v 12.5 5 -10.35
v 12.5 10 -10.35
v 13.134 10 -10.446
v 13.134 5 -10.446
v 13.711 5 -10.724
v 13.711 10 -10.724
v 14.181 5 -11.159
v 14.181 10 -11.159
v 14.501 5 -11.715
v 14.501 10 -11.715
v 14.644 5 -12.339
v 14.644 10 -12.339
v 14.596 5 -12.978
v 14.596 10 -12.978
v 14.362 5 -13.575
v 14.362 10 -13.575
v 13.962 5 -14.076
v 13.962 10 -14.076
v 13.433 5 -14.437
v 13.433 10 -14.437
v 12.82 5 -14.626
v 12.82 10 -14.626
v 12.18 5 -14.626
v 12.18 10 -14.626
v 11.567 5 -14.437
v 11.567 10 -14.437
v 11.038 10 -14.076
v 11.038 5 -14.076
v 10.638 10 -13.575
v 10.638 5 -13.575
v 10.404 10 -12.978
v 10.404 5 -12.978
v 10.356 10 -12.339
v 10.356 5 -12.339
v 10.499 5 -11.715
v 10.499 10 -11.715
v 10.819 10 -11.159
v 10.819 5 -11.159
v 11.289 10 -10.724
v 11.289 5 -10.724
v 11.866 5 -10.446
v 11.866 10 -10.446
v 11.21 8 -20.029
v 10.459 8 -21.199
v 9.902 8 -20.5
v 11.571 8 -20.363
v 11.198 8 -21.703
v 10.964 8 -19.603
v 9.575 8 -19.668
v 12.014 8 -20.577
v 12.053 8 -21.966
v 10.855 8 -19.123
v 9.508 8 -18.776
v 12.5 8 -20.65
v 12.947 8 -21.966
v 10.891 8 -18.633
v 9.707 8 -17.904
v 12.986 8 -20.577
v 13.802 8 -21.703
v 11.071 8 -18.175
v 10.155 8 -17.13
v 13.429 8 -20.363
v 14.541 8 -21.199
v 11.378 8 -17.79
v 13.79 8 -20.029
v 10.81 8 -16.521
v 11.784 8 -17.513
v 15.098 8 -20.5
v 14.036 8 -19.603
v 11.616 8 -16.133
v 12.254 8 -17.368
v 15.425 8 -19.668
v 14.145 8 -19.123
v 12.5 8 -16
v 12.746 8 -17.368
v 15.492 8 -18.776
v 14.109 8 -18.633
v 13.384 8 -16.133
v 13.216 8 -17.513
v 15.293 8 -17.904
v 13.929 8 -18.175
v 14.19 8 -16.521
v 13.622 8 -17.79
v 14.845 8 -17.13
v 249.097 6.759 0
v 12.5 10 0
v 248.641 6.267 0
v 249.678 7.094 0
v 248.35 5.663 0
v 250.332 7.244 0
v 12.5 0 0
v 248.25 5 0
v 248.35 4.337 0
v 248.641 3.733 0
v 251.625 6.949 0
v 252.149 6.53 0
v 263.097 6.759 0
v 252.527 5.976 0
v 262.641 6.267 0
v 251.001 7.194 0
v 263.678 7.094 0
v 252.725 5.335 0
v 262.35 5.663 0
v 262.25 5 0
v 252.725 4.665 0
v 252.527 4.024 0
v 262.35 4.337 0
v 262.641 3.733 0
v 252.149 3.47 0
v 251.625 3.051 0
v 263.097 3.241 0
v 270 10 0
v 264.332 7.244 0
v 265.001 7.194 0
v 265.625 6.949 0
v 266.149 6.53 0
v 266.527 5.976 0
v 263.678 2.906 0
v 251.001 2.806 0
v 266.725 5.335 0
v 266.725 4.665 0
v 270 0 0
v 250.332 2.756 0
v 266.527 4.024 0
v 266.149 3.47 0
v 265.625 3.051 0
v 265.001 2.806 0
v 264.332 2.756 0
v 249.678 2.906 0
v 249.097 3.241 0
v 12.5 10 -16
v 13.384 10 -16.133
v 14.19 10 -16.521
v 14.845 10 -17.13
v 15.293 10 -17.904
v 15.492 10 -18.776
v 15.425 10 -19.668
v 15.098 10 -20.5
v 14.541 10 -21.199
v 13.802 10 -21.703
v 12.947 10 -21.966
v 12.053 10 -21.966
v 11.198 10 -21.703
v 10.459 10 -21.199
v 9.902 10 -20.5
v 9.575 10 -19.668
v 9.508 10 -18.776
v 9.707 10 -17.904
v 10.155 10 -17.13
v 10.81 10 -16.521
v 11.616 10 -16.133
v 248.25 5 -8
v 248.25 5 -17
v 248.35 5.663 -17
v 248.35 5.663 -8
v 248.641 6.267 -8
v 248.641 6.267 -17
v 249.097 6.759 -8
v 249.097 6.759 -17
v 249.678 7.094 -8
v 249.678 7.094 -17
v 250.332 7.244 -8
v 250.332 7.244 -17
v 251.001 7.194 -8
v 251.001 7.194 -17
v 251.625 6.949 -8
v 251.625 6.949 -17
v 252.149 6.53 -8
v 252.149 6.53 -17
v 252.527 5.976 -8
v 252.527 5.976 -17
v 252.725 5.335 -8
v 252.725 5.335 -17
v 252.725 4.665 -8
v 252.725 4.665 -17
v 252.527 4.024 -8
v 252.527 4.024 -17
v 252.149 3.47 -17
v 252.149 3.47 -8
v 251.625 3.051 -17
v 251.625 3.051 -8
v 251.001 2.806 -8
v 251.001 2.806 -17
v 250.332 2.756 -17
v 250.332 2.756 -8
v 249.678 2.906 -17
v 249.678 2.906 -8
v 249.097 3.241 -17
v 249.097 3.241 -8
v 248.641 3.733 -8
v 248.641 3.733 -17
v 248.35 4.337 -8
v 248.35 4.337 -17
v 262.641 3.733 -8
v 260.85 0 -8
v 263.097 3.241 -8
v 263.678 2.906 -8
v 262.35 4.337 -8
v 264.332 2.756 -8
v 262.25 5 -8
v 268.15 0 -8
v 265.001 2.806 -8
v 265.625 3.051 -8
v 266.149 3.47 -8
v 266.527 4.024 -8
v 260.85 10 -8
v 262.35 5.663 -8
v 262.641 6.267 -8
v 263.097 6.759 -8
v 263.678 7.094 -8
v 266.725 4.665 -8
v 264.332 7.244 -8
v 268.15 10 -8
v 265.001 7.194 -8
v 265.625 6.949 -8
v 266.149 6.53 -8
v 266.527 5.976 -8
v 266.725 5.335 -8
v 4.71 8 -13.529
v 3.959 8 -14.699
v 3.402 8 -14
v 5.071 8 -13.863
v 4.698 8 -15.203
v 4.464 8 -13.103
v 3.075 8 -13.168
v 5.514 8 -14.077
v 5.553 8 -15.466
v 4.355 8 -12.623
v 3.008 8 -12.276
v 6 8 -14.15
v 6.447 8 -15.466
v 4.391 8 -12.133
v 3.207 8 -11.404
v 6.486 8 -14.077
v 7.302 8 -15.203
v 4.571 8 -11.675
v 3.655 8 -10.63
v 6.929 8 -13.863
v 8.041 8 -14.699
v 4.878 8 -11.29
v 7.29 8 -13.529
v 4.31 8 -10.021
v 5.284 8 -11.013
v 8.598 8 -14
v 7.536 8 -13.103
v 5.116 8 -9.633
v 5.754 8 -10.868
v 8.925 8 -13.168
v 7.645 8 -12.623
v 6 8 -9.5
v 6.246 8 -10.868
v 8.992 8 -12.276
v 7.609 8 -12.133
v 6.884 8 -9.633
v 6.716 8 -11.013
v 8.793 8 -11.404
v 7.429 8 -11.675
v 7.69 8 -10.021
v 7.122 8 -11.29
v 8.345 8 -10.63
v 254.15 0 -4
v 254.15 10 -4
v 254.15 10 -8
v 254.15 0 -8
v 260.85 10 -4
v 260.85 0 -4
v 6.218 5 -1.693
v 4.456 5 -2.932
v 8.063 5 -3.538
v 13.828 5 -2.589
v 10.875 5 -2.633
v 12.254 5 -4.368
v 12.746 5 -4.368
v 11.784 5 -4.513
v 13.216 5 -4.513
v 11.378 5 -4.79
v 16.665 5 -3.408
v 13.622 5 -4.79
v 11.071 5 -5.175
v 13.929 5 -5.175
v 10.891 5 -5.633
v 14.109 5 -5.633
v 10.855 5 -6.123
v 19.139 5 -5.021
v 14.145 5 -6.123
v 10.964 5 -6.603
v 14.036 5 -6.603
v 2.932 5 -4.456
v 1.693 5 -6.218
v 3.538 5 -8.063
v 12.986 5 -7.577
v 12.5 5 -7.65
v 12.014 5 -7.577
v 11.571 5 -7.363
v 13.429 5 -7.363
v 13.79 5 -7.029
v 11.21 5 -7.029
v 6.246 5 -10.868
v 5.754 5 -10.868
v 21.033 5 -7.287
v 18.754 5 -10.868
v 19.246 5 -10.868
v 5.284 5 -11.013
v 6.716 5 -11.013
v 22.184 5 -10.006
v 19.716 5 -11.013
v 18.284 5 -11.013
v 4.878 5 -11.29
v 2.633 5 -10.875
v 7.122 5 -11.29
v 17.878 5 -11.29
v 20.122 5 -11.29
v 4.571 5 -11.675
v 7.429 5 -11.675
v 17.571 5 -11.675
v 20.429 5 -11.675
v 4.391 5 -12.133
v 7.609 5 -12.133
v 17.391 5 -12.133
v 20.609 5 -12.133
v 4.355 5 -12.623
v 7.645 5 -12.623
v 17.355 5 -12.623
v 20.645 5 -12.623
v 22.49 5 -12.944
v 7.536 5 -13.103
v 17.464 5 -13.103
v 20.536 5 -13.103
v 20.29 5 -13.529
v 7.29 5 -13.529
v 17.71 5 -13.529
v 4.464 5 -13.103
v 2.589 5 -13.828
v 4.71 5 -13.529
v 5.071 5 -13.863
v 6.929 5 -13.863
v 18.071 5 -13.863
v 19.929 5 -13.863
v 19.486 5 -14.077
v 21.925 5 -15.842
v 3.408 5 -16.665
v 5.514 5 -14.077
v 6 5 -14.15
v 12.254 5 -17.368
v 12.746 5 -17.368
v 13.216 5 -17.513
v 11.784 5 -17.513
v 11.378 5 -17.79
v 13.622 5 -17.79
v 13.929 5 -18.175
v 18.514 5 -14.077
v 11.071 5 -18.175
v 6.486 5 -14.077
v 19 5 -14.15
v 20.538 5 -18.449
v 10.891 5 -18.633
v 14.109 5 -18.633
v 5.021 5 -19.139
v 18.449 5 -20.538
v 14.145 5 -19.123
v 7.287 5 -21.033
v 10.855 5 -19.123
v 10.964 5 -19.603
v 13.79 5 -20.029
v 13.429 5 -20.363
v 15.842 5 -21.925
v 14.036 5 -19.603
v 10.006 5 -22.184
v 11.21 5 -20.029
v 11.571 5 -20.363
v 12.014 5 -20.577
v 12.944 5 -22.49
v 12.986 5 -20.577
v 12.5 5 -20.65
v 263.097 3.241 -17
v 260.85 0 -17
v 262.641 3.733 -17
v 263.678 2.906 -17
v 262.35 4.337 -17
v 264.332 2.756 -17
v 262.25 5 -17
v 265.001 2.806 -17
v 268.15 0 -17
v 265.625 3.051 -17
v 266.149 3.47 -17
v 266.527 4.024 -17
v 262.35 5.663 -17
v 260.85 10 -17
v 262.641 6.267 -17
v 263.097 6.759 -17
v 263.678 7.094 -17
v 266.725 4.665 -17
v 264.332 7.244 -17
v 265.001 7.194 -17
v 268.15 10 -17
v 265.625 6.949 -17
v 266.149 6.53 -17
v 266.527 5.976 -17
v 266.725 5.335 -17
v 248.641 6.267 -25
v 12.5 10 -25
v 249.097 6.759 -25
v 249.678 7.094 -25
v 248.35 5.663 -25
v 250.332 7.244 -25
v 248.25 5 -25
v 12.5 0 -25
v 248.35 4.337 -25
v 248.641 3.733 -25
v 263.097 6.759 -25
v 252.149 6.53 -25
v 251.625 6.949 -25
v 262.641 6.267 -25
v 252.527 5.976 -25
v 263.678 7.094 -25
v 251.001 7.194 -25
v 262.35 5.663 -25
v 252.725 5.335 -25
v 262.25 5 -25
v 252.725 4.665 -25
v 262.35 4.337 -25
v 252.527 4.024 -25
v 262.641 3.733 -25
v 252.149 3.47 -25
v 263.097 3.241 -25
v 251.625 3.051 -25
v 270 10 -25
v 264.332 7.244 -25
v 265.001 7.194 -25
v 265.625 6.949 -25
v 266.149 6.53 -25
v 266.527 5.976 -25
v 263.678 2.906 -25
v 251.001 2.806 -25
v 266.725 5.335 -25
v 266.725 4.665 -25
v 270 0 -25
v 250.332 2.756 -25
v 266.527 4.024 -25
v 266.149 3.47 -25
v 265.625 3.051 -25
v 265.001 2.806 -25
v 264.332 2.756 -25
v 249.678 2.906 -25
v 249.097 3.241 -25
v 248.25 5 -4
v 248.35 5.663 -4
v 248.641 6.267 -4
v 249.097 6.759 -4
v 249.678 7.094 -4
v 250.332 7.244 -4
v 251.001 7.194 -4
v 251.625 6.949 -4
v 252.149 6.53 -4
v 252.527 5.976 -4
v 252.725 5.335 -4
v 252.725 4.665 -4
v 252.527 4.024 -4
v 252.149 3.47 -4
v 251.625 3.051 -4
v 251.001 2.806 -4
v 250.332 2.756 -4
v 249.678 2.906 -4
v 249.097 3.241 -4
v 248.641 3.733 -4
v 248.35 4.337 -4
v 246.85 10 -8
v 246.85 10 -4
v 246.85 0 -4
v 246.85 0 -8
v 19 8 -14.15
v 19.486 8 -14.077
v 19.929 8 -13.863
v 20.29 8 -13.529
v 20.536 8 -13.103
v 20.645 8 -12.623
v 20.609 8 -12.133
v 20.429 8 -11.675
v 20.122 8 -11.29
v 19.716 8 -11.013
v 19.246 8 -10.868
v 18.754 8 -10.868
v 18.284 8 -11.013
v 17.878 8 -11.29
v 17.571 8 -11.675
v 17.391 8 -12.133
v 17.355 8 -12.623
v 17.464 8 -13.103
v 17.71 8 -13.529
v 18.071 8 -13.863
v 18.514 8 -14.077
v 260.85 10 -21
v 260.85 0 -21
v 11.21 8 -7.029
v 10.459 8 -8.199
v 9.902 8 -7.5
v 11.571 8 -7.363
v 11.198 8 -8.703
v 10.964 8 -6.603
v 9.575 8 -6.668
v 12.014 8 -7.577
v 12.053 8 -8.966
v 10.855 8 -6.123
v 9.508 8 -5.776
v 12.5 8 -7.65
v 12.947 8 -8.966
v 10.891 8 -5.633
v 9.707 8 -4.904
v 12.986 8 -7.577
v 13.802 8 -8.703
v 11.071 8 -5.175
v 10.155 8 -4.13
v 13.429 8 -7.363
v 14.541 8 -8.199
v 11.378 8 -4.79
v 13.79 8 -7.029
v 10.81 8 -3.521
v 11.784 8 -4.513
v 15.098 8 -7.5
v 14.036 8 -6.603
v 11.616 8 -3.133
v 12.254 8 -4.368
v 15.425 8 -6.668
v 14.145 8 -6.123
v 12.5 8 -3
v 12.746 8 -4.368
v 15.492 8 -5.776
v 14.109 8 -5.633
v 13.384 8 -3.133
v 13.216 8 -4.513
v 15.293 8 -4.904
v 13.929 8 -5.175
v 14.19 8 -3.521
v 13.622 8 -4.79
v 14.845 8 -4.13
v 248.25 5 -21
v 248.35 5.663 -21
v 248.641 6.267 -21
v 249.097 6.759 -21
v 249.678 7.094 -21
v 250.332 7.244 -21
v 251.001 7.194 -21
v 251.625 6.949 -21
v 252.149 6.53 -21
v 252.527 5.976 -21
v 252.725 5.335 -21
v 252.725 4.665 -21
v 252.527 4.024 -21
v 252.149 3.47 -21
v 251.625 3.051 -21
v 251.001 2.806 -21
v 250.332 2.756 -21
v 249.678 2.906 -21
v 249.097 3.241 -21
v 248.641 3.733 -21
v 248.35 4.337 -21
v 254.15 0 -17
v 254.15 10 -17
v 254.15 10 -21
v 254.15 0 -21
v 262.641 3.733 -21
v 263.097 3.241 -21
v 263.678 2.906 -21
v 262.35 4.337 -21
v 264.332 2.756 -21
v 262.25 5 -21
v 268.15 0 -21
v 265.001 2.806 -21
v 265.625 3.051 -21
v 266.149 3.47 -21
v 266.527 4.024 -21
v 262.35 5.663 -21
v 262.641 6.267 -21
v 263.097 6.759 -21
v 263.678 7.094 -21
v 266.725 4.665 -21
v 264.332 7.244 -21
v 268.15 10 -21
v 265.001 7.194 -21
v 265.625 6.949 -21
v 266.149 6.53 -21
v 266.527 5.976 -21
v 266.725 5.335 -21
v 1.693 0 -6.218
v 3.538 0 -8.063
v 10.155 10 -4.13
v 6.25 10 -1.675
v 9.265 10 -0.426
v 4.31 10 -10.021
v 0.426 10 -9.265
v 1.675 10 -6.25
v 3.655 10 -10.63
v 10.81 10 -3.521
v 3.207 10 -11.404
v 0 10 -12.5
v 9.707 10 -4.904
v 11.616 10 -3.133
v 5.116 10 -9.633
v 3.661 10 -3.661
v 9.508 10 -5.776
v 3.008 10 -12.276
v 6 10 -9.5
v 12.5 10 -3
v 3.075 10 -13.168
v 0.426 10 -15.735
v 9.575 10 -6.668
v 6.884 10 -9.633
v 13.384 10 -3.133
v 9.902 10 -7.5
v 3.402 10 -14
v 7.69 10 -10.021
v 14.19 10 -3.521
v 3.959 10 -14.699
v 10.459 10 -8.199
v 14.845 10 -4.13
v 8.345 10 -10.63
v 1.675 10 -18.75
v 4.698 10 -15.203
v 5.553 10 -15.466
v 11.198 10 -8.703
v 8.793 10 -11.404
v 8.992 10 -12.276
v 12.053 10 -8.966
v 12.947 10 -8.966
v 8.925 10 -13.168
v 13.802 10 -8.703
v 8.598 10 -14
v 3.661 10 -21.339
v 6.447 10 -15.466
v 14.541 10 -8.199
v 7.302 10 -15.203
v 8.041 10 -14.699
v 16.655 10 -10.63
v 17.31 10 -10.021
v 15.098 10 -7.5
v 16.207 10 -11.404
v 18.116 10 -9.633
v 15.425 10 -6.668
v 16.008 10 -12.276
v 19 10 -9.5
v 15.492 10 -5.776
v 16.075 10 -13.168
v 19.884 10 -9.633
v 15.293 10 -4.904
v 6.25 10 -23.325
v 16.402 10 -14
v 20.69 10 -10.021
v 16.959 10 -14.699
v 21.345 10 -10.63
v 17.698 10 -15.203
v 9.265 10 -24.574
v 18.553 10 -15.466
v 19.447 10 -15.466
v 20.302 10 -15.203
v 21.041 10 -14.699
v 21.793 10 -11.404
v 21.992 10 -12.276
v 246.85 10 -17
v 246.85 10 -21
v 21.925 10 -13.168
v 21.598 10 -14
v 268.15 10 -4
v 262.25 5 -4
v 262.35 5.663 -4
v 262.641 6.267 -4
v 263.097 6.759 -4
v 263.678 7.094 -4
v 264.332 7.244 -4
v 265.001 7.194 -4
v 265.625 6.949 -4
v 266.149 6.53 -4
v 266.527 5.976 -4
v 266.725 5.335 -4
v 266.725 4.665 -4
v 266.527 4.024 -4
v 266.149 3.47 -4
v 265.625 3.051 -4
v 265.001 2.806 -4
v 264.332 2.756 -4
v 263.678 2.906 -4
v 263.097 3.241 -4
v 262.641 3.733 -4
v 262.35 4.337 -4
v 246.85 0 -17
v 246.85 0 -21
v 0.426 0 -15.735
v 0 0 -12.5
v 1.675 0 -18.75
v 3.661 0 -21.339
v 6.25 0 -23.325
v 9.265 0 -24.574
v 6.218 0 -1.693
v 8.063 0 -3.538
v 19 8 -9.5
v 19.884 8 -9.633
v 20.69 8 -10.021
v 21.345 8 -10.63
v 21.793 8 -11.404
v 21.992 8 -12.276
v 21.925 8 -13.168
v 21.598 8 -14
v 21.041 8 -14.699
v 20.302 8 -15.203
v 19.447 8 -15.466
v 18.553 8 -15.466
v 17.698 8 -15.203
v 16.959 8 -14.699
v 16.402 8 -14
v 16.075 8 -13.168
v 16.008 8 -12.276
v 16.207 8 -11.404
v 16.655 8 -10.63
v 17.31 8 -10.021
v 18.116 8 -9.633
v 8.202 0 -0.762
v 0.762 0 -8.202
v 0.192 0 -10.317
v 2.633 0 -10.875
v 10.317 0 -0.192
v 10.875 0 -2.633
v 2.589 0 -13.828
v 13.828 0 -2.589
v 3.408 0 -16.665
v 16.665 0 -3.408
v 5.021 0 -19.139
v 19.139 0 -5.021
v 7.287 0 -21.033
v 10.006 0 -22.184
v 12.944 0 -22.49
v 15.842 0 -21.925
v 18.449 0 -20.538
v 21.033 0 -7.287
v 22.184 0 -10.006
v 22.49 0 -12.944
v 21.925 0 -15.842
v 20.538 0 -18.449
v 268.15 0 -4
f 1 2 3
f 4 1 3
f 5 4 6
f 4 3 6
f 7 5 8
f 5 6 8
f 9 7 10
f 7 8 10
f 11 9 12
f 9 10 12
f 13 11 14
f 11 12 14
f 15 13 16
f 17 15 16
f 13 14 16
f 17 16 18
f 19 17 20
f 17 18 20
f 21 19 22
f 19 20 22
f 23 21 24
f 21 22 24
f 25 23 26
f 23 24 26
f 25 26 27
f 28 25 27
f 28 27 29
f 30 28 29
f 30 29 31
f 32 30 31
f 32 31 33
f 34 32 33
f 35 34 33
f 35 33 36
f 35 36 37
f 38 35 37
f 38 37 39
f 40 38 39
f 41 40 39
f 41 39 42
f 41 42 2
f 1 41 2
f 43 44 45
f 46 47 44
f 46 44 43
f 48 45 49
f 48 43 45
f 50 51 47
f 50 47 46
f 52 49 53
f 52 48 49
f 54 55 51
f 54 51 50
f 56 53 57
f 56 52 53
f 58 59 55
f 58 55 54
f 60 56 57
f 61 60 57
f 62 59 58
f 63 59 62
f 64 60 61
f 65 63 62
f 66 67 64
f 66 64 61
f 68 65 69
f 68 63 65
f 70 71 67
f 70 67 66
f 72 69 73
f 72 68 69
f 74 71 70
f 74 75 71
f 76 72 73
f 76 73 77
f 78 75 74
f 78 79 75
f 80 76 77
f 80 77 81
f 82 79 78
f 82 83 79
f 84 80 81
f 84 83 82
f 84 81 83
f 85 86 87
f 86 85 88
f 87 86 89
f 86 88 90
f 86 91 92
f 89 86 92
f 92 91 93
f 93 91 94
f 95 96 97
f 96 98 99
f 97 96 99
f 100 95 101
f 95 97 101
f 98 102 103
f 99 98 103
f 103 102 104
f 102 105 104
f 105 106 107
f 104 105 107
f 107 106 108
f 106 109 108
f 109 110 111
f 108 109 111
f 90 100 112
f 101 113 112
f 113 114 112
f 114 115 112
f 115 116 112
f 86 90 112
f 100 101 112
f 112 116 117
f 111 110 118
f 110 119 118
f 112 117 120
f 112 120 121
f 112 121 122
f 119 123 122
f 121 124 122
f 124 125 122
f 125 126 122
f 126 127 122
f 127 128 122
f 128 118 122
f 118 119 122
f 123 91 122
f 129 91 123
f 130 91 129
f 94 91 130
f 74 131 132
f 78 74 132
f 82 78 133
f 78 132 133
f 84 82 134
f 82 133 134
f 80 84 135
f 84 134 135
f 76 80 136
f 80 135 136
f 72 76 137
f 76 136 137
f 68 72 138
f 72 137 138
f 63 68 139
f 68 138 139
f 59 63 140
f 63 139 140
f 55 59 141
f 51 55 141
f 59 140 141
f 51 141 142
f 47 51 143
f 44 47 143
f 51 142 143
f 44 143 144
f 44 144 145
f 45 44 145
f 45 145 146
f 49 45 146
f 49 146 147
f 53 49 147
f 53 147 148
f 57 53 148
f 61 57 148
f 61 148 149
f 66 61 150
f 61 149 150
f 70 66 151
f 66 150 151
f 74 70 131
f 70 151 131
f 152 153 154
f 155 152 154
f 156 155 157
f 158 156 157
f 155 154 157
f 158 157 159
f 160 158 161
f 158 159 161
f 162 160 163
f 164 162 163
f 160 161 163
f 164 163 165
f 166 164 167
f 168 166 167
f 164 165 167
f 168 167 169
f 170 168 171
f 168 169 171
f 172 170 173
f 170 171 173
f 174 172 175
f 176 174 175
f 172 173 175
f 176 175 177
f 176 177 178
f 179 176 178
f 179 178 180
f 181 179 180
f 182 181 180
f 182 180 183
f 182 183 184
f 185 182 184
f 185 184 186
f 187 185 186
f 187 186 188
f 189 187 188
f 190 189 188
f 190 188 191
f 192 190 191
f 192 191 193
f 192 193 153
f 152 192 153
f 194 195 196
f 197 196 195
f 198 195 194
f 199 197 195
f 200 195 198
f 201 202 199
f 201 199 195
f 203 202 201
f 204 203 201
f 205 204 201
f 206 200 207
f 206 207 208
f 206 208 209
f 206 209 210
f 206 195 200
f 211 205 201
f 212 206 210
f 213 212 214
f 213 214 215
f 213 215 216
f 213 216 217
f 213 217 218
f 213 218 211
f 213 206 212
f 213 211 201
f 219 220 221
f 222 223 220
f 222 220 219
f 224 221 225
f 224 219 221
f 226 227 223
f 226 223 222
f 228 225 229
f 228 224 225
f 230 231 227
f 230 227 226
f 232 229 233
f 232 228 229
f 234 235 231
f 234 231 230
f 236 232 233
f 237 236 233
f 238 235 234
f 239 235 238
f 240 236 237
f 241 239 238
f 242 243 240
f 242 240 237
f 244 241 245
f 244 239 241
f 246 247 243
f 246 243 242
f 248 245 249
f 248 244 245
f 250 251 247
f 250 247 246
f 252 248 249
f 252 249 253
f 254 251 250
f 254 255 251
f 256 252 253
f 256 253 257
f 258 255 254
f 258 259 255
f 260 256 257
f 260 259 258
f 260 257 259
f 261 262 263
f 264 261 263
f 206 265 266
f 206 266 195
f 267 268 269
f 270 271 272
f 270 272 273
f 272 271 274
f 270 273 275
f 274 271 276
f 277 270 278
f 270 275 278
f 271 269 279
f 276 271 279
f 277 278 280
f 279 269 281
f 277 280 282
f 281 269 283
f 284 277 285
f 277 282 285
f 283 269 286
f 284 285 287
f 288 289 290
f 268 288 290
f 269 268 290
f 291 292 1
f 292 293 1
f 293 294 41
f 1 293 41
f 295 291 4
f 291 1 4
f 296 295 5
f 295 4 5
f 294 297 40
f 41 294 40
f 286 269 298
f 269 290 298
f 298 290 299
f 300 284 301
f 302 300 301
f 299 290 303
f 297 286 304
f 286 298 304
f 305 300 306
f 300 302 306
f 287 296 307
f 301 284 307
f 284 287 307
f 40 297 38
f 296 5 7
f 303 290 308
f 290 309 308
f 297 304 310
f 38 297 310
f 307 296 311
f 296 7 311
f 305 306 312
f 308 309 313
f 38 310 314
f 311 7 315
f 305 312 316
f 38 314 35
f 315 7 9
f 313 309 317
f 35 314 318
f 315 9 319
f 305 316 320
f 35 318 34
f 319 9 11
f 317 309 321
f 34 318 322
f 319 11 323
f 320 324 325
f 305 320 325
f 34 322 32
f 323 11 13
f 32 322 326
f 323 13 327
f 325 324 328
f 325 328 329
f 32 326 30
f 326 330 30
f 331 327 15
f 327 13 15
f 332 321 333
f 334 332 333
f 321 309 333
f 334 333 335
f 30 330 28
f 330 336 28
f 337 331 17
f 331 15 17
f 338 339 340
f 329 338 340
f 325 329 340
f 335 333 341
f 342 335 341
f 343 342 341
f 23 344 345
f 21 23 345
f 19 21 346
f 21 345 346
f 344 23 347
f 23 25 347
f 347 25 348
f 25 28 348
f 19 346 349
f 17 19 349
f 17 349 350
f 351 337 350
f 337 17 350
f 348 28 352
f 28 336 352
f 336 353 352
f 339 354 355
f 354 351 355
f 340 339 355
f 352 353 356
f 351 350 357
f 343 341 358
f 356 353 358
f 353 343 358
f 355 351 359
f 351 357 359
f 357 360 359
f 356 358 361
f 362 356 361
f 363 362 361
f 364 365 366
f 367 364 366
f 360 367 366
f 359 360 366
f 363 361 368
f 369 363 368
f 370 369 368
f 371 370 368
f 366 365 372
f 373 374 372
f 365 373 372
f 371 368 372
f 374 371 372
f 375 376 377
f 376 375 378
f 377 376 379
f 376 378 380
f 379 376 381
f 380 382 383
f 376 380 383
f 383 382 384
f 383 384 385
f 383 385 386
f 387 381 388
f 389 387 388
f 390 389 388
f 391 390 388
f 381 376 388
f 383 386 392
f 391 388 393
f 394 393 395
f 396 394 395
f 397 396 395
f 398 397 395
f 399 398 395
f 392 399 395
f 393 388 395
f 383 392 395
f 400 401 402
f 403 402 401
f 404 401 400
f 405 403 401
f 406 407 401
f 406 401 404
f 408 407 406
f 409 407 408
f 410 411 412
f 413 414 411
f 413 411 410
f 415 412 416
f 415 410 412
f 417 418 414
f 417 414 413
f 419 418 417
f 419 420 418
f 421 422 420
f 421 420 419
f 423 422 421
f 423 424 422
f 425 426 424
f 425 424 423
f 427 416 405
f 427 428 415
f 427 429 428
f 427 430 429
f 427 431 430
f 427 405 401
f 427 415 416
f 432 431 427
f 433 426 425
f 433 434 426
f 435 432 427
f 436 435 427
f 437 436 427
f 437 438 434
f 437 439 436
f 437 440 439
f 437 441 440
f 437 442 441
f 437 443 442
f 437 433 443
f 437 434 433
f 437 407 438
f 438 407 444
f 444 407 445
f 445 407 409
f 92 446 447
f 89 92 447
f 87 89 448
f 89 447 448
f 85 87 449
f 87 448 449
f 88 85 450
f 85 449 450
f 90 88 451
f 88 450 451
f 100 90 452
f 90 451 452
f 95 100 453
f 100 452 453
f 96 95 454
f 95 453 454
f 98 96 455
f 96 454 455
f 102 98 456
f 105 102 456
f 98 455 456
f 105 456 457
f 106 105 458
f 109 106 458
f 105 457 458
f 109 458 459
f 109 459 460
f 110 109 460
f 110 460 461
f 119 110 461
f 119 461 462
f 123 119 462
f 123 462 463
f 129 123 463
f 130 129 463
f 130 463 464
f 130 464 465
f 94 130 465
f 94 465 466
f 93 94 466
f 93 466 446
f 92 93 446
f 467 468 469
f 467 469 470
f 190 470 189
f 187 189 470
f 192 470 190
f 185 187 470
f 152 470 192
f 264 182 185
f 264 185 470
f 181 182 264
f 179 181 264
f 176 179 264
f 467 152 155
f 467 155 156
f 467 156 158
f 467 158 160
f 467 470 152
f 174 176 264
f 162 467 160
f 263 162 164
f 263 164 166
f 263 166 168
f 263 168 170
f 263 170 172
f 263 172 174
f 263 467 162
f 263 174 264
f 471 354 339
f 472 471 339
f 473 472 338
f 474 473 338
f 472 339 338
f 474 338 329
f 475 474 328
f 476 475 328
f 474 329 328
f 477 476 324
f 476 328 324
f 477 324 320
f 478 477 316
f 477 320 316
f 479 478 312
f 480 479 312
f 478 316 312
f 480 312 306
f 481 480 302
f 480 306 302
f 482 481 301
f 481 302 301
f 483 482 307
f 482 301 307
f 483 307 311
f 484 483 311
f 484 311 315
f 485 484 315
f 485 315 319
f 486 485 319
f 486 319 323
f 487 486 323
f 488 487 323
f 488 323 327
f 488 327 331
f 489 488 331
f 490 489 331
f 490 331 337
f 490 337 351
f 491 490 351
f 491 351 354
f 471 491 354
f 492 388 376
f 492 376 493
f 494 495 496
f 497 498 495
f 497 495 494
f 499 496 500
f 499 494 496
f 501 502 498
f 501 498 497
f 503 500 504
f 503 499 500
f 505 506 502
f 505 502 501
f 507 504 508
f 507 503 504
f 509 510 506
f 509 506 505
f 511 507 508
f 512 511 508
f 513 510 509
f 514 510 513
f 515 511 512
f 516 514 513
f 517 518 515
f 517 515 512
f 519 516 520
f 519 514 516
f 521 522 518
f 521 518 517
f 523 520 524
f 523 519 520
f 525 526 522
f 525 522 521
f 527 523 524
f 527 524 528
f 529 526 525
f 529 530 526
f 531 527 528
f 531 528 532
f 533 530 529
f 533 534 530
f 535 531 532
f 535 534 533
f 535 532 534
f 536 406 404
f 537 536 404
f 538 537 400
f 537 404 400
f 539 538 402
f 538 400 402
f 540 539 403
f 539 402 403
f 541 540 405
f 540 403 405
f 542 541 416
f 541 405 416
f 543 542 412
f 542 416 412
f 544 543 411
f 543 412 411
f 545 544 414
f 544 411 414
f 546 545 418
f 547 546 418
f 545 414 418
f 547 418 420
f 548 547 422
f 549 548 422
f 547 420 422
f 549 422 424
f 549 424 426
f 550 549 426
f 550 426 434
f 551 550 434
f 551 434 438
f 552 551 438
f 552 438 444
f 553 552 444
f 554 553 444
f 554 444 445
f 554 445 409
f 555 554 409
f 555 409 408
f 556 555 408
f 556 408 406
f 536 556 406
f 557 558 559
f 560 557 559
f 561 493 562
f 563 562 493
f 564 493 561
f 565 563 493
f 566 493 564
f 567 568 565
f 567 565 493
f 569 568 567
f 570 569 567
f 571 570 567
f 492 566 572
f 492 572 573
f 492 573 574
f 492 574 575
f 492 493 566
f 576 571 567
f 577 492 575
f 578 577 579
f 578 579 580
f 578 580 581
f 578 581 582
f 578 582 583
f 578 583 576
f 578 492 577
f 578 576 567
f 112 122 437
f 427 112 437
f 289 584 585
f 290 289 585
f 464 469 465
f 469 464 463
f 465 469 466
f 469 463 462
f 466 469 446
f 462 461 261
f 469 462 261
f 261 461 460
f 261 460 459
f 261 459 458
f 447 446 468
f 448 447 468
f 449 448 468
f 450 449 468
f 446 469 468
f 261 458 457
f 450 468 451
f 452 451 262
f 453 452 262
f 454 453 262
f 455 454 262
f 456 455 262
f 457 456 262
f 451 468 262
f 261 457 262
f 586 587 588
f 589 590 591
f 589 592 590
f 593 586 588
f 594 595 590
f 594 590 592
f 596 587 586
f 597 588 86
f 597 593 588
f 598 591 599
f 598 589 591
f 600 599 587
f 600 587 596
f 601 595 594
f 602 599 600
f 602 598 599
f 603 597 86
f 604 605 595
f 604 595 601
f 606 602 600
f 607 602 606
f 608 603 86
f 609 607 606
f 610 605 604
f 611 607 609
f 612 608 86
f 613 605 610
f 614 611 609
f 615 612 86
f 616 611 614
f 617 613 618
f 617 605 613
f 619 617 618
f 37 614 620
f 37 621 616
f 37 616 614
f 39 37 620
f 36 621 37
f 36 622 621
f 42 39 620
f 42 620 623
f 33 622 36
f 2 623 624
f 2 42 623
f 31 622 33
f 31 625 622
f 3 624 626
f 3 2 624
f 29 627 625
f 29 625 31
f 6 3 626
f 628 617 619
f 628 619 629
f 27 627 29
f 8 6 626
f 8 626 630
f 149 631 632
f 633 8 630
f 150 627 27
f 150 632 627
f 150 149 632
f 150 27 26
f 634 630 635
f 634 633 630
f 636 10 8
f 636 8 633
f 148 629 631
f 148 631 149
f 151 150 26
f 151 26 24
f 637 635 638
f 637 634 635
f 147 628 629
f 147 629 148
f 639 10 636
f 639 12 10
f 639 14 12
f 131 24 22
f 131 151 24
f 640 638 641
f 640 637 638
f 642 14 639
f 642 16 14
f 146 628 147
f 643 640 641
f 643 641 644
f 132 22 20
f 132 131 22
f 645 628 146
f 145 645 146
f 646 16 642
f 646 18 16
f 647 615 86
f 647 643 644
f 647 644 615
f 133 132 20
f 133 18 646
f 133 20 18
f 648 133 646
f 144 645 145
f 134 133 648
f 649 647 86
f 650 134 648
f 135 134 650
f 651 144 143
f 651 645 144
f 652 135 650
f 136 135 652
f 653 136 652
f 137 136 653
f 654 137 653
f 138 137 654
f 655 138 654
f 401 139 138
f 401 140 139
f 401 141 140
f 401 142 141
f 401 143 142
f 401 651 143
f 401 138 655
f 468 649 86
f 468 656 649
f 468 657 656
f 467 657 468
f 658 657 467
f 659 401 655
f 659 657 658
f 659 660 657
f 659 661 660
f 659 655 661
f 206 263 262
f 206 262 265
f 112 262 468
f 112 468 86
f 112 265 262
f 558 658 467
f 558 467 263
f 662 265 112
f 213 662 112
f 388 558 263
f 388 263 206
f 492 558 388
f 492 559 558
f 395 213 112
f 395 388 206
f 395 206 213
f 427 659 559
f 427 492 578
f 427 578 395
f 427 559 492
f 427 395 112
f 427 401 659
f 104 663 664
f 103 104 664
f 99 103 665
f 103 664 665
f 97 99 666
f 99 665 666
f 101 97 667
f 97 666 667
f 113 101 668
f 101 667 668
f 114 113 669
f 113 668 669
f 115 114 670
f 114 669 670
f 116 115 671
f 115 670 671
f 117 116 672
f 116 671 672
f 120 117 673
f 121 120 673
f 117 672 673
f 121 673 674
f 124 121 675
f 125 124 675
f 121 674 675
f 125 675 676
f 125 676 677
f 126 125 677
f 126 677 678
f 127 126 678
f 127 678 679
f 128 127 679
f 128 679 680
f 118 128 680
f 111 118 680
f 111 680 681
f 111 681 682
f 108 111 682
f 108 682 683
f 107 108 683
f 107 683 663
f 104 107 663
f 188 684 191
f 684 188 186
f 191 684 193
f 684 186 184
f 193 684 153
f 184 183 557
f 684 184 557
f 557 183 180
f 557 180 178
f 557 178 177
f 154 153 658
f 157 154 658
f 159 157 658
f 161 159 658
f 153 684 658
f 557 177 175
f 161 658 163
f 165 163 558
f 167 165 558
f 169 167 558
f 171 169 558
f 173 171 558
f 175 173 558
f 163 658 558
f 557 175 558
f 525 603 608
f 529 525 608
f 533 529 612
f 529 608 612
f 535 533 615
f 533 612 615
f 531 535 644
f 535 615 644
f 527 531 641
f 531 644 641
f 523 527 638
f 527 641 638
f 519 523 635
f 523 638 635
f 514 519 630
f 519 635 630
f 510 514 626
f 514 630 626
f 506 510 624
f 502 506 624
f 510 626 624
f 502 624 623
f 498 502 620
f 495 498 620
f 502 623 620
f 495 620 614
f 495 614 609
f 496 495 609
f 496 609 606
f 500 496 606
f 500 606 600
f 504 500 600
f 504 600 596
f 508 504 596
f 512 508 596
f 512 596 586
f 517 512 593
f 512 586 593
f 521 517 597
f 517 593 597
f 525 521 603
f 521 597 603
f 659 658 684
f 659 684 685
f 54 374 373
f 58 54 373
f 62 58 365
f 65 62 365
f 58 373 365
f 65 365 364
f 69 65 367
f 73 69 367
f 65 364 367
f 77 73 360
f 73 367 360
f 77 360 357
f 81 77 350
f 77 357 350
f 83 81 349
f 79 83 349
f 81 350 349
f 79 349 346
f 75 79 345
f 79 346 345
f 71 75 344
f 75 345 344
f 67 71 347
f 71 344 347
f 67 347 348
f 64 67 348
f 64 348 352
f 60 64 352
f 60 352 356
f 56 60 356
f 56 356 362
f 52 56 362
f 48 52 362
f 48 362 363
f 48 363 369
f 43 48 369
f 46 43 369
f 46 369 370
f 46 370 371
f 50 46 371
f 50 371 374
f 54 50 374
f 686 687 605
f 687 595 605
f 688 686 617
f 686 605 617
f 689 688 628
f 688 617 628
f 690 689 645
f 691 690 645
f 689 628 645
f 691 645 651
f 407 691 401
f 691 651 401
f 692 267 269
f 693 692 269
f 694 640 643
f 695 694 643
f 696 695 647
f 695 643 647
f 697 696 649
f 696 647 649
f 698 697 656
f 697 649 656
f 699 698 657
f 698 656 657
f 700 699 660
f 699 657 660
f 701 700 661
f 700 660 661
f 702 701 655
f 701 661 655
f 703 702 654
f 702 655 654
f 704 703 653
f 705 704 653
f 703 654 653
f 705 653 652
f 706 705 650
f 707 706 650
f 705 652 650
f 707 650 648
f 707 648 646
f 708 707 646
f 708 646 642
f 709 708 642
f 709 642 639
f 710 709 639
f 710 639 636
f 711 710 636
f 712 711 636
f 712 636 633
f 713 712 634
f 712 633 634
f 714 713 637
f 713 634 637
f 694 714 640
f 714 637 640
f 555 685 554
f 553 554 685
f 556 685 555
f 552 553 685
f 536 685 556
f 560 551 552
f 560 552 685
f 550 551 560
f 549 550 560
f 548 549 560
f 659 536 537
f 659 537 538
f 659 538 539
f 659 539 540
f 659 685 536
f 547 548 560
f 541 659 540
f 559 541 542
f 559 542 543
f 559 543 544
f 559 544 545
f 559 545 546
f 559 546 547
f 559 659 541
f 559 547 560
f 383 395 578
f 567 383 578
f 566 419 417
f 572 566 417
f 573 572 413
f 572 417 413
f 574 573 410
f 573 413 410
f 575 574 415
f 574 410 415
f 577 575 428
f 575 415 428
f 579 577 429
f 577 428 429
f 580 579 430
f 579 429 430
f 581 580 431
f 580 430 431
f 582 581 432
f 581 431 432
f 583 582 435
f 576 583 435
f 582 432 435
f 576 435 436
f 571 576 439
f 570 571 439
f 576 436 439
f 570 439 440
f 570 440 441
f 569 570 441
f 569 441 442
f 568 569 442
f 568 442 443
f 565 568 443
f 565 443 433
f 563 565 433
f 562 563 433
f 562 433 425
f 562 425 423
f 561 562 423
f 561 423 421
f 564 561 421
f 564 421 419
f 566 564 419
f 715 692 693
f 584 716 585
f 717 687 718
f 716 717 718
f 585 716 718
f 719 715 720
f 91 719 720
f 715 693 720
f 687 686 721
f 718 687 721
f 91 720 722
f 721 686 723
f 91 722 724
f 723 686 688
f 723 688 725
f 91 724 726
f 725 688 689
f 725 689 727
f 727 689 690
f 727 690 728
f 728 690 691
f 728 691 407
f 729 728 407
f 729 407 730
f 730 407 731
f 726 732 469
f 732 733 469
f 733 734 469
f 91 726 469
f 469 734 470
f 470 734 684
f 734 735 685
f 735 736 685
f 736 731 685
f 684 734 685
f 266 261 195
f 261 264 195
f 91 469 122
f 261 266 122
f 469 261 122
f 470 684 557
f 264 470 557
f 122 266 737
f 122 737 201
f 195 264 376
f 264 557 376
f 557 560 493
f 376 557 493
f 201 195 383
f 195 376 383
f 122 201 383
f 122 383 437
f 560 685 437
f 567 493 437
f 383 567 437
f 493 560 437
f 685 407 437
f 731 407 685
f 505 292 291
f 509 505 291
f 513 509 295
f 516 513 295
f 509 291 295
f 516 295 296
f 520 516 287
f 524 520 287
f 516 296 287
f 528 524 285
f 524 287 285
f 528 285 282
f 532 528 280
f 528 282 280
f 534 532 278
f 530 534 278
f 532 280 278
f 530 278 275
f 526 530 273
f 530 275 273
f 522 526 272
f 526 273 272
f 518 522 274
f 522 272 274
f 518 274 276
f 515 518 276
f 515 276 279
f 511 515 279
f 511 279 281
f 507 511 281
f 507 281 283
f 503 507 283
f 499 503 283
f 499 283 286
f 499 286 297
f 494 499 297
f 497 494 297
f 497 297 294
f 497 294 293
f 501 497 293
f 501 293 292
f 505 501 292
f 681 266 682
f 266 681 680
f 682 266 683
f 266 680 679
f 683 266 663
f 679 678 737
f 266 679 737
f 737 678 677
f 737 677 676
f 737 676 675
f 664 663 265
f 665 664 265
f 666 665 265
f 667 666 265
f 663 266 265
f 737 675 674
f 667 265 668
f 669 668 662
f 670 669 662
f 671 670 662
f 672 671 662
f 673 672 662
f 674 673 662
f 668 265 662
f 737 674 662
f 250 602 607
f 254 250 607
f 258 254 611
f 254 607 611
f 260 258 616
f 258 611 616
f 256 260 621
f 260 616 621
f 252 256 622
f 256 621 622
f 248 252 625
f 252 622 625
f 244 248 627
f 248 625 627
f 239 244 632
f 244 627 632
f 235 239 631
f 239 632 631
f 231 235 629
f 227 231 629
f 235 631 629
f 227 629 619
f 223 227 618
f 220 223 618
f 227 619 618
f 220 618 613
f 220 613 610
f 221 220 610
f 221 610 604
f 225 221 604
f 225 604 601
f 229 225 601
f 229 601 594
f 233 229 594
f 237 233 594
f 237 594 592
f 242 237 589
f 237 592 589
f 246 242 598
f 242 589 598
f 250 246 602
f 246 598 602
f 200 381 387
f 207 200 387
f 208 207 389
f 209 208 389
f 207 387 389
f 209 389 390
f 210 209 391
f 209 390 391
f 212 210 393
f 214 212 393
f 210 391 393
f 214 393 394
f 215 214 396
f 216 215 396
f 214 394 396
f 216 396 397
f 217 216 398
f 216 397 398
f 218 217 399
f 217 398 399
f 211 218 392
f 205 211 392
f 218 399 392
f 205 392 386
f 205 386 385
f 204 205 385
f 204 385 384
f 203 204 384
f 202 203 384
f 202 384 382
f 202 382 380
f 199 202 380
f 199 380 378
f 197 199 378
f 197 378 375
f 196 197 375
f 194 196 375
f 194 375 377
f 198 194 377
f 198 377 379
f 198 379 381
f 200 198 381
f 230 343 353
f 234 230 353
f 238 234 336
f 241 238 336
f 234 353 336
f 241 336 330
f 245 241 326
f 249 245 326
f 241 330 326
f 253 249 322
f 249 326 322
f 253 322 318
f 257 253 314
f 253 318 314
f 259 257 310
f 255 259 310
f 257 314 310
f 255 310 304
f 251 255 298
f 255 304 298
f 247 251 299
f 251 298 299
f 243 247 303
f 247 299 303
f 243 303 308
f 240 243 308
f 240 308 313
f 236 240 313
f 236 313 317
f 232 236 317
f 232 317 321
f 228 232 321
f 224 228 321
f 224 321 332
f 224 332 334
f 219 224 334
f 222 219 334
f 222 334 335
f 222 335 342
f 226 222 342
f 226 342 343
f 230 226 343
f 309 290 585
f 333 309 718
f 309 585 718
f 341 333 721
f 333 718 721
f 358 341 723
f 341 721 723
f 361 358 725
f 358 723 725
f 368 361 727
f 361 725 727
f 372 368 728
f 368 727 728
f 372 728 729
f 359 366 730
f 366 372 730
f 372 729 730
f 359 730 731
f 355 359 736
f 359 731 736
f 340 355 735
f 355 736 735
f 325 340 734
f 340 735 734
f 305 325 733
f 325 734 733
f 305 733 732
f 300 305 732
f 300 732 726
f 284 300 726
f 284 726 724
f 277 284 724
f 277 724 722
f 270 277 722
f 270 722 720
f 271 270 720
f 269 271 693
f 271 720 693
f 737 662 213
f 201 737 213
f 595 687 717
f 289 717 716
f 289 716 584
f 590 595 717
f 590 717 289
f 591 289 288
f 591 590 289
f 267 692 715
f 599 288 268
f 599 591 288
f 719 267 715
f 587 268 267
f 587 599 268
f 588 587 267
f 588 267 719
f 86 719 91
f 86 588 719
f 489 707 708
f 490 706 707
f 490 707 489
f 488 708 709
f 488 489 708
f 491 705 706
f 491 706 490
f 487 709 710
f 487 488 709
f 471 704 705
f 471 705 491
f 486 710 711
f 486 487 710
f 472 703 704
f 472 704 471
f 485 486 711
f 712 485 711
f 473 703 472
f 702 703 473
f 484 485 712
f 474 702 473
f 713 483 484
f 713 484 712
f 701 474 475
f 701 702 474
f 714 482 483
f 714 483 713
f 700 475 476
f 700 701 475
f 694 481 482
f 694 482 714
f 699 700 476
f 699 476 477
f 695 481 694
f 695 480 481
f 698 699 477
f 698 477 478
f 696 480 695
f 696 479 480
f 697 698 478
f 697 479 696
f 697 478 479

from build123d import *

# Parameters (mm, degrees)
SKETCH1_W              = 270
SKETCH1_H              = 25
BOSS_EXTRUDE1_DEPTH    = 10
CUT_EXTRUDE1_REACH     = 273.339
SKETCH2_R              = 2.15
FILLET1_R              = 12.5
SKETCH3_R              = 2.25
CUT_EXTRUDE2_DEPTH     = 272.339271024
CUT_EXTRUDE5_REACH     = 273.339
SKETCH5_W              = 7.3
SKETCH5_H              = 4
SKETCH6_R              = 10
CUT_EXTRUDE6_DEPTH     = 5
CUT_EXTRUDE7_REACH     = 273.201
SKETCH7_R              = 1.65
CUT_EXTRUDE8_START     = -3.2
CUT_EXTRUDE8_OUTLINE_W = 6
CUT_EXTRUDE8_OUTLINE_H = 6
CUT_EXTRUDE8_DEPTH     = 6.4
SKETCH9_R              = 3
CUT_EXTRUDE9_DEPTH     = 2


# Read off the part's stored shape, not the designer's step: Cut-Extrude8
with BuildPart() as part:
    # Sketch1 → Boss-Extrude1 (new body)
    with BuildSketch(Plane(origin=(0, 0, 0), x_dir=(1, 0, 0), z_dir=(0, 1, 0))):
        with Locations((135, 12.5)):
            Rectangle(SKETCH1_W, SKETCH1_H)
    extrude(amount=BOSS_EXTRUDE1_DEPTH)

    # Sketch2 → Cut-Extrude1 (cut, up to next)
    with BuildSketch(Plane(origin=(0, 10, 0), x_dir=(1, 0, 0), z_dir=(0, 1, 0)), mode=Mode.PRIVATE) as cut_extrude1_sk1:
        with Locations(Location((12.5, 12.5, 0), (0, 0, 270))):
            Circle(SKETCH2_R)
    cut_extrude1_tool1 = extrude(cut_extrude1_sk1.sketch, amount=-CUT_EXTRUDE1_REACH, mode=Mode.PRIVATE) & part.part
    add(cut_extrude1_tool1.solids().sort_by_distance((12.5, 10, -12.5))[0], mode=Mode.SUBTRACT)

    # Fillet1
    fillet1_edges = [part.edges().sort_by_distance(p)[0] for p in [
        (0, 5, 0),
        (0, 5, -25),
    ]]
    fillet(fillet1_edges, radius=FILLET1_R - 0.0001)  # a hair under: the kernel refuses the full size

    # Sketch3 → Cut-Extrude2 (cut, through all)
    with BuildSketch(Plane(origin=(0, 0, -25), x_dir=(-1, 0, 0), z_dir=(0, 0, -1))):
        with Locations((-264.5, 5)):
            Circle(SKETCH3_R)
        with Locations((-250.5, 5)):
            Circle(SKETCH3_R)
    extrude(amount=-CUT_EXTRUDE2_DEPTH, mode=Mode.SUBTRACT)

    # Sketch5 → Cut-Extrude5 (cut, up to next)
    with BuildSketch(Plane(origin=(0, 10, 0), x_dir=(1, 0, 0), z_dir=(0, 1, 0)), mode=Mode.PRIVATE) as cut_extrude5_sk1:
        with Locations((264.5, 19)):
            Rectangle(SKETCH5_W, SKETCH5_H)
    cut_extrude5_tool1 = extrude(cut_extrude5_sk1.sketch, amount=-CUT_EXTRUDE5_REACH, mode=Mode.PRIVATE) & part.part
    # Sketch5 → Cut-Extrude5 (cut, up to next)
    with BuildSketch(Plane(origin=(0, 10, 0), x_dir=(1, 0, 0), z_dir=(0, 1, 0)), mode=Mode.PRIVATE) as cut_extrude5_sk2:
        with Locations((264.5, 6)):
            Rectangle(SKETCH5_W, SKETCH5_H)
    cut_extrude5_tool2 = extrude(cut_extrude5_sk2.sketch, amount=-CUT_EXTRUDE5_REACH, mode=Mode.PRIVATE) & part.part
    # Sketch5 → Cut-Extrude5 (cut, up to next)
    with BuildSketch(Plane(origin=(0, 10, 0), x_dir=(1, 0, 0), z_dir=(0, 1, 0)), mode=Mode.PRIVATE) as cut_extrude5_sk3:
        with Locations((250.5, 19)):
            Rectangle(SKETCH5_W, SKETCH5_H)
    cut_extrude5_tool3 = extrude(cut_extrude5_sk3.sketch, amount=-CUT_EXTRUDE5_REACH, mode=Mode.PRIVATE) & part.part
    # Sketch5 → Cut-Extrude5 (cut, up to next)
    with BuildSketch(Plane(origin=(0, 10, 0), x_dir=(1, 0, 0), z_dir=(0, 1, 0)), mode=Mode.PRIVATE) as cut_extrude5_sk4:
        with Locations((250.5, 6)):
            Rectangle(SKETCH5_W, SKETCH5_H)
    cut_extrude5_tool4 = extrude(cut_extrude5_sk4.sketch, amount=-CUT_EXTRUDE5_REACH, mode=Mode.PRIVATE) & part.part
    add(cut_extrude5_tool1.solids().sort_by_distance((264.5, 10, -19))[0], mode=Mode.SUBTRACT)
    add(cut_extrude5_tool2.solids().sort_by_distance((264.5, 10, -6))[0], mode=Mode.SUBTRACT)
    add(cut_extrude5_tool3.solids().sort_by_distance((250.5, 10, -19))[0], mode=Mode.SUBTRACT)
    add(cut_extrude5_tool4.solids().sort_by_distance((250.5, 10, -6))[0], mode=Mode.SUBTRACT)

    # Sketch6 → Cut-Extrude6 (cut)
    with BuildSketch(Plane.XZ):
        with Locations(Location((12.5, -12.5, 0), (0, 0, 270))):
            Circle(SKETCH6_R)
    extrude(amount=-CUT_EXTRUDE6_DEPTH, mode=Mode.SUBTRACT)

    # Sketch7 → Cut-Extrude7 (cut, up to next)
    with BuildSketch(Plane.XZ.offset(-5), mode=Mode.PRIVATE) as cut_extrude7_sk1:
        with Locations(Location((12.5, -6, 0), (0, 0, 270))):
            Circle(SKETCH7_R)
    cut_extrude7_tool1 = extrude(cut_extrude7_sk1.sketch, amount=-CUT_EXTRUDE7_REACH, mode=Mode.PRIVATE) & part.part
    # Sketch7 → Cut-Extrude7 (cut, up to next)
    with BuildSketch(Plane.XZ.offset(-5), mode=Mode.PRIVATE) as cut_extrude7_sk2:
        with Locations(Location((19, -12.5, 0), (0, 0, 270))):
            Circle(SKETCH7_R)
    cut_extrude7_tool2 = extrude(cut_extrude7_sk2.sketch, amount=-CUT_EXTRUDE7_REACH, mode=Mode.PRIVATE) & part.part
    # Sketch7 → Cut-Extrude7 (cut, up to next)
    with BuildSketch(Plane.XZ.offset(-5), mode=Mode.PRIVATE) as cut_extrude7_sk3:
        with Locations(Location((12.5, -19, 0), (0, 0, 270))):
            Circle(SKETCH7_R)
    cut_extrude7_tool3 = extrude(cut_extrude7_sk3.sketch, amount=-CUT_EXTRUDE7_REACH, mode=Mode.PRIVATE) & part.part
    # Sketch7 → Cut-Extrude7 (cut, up to next)
    with BuildSketch(Plane.XZ.offset(-5), mode=Mode.PRIVATE) as cut_extrude7_sk4:
        with Locations(Location((6, -12.5, 0), (0, 0, 270))):
            Circle(SKETCH7_R)
    cut_extrude7_tool4 = extrude(cut_extrude7_sk4.sketch, amount=-CUT_EXTRUDE7_REACH, mode=Mode.PRIVATE) & part.part
    add(cut_extrude7_tool1.solids().sort_by_distance((12.5, 5, -6))[0], mode=Mode.SUBTRACT)
    add(cut_extrude7_tool2.solids().sort_by_distance((19, 5, -12.5))[0], mode=Mode.SUBTRACT)
    add(cut_extrude7_tool3.solids().sort_by_distance((12.5, 5, -19))[0], mode=Mode.SUBTRACT)
    add(cut_extrude7_tool4.solids().sort_by_distance((6, 5, -12.5))[0], mode=Mode.SUBTRACT)

    # Cut-Extrude8 outline → Cut-Extrude8 (cut)
    with BuildSketch(Plane(origin=(0, 0, 0), x_dir=(0.707106781186548, 0, -0.707106781186547), z_dir=(0.707106781186547, 0, 0.707106781186548)).offset(CUT_EXTRUDE8_START)):
        with Locations((7, 2)):
            Rectangle(CUT_EXTRUDE8_OUTLINE_W, CUT_EXTRUDE8_OUTLINE_H)
    extrude(amount=CUT_EXTRUDE8_DEPTH, mode=Mode.SUBTRACT)

    # Sketch9 → Cut-Extrude9 (cut)
    with BuildSketch(Plane(origin=(0, 10, 0), x_dir=(1, 0, 0), z_dir=(0, 1, 0))):
        with Locations(Location((12.5, 19, 0), (0, 0, 270))):
            Circle(SKETCH9_R)
        with Locations(Location((19, 12.5, 0), (0, 0, 270))):
            Circle(SKETCH9_R)
        with Locations(Location((12.5, 6, 0), (0, 0, 270))):
            Circle(SKETCH9_R)
        with Locations(Location((6, 12.5, 0), (0, 0, 270))):
            Circle(SKETCH9_R)
    extrude(amount=-CUT_EXTRUDE9_DEPTH, mode=Mode.SUBTRACT)


solid = part.part
